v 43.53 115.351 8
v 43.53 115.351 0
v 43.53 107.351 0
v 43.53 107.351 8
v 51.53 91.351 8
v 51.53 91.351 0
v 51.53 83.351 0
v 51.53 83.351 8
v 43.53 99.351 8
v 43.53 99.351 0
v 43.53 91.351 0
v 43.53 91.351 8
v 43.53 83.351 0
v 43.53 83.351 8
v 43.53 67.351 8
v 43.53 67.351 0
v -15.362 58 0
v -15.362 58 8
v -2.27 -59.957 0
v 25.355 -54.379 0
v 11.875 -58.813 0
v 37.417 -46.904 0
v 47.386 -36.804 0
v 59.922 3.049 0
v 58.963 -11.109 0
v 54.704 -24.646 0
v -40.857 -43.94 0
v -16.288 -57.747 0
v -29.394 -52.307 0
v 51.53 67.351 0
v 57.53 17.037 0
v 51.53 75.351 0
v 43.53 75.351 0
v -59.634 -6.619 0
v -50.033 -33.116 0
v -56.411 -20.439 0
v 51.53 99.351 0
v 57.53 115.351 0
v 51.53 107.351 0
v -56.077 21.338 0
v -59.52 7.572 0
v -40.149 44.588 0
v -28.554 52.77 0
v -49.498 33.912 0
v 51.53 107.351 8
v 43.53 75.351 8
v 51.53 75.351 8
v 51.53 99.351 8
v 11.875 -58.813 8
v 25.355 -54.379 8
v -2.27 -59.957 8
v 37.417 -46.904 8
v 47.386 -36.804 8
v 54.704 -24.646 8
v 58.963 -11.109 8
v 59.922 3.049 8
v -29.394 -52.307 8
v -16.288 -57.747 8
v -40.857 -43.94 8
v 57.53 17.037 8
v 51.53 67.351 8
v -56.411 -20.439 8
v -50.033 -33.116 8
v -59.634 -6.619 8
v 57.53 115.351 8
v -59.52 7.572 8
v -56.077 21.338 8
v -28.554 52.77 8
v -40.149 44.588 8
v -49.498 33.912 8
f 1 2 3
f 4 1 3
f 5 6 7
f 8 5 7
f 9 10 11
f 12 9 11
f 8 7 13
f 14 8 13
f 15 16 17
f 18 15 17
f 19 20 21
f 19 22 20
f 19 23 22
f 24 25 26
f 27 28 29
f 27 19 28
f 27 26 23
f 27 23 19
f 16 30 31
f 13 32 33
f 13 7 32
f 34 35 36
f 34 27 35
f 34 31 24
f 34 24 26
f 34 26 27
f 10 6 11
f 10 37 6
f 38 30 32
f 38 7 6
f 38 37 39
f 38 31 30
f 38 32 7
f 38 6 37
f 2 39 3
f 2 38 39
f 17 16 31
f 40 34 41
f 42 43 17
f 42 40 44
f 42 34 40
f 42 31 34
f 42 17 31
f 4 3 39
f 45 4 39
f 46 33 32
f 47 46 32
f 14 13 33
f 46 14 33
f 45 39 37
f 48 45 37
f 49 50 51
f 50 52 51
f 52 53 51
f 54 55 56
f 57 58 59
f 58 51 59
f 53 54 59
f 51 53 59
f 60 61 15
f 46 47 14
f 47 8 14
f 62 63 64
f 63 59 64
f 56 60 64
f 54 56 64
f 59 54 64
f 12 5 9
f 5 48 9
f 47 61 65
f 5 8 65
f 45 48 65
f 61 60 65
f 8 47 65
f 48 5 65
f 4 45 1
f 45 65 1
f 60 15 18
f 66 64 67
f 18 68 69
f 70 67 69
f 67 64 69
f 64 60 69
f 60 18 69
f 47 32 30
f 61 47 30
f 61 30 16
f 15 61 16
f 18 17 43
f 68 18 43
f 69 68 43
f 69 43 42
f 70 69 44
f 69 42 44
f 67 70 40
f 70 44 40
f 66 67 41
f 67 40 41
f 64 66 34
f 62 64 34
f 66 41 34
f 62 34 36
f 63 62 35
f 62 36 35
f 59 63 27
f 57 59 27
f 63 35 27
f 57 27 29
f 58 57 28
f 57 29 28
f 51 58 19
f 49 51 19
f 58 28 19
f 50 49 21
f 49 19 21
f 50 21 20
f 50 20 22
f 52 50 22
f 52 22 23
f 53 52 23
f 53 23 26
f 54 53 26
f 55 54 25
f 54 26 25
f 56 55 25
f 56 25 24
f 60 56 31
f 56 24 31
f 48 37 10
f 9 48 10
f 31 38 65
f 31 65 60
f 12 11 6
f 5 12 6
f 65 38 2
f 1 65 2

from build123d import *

# Parameters (mm, degrees)
PAD_DEPTH = 8


with BuildPart() as part:
    # Sketch → Pad (new body)
    with BuildSketch(Plane.XY):
        with BuildLine():
            Line((51.5303, 115.351058), (57.5303, 115.351058))
            Line((57.5303, 115.351058), (57.5303, 17.037153))
            ThreePointArc((-15.362291, 58), (-29.394284, -52.306558), (57.5303, 17.037153))
            Line((43.5303, 67.351058), (-15.362291, 58))
            Line((51.5303, 67.351058), (43.5303, 67.351058))
            Line((51.5303, 75.351058), (51.5303, 67.351058))
            Line((43.5303, 75.351058), (51.5303, 75.351058))
            Line((43.5303, 83.351058), (43.5303, 75.351058))
            Line((51.5303, 83.351058), (43.5303, 83.351058))
            Line((51.5303, 91.351058), (51.5303, 83.351058))
            Line((43.5303, 91.351058), (51.5303, 91.351058))
            Line((43.5303, 99.351058), (43.5303, 91.351058))
            Line((51.5303, 99.351058), (43.5303, 99.351058))
            Line((51.5303, 107.351058), (51.5303, 99.351058))
            Line((43.5303, 107.351058), (51.5303, 107.351058))
            Line((43.5303, 115.351058), (43.5303, 107.351058))
            Line((51.5303, 115.351058), (43.5303, 115.351058))
        make_face()
    extrude(amount=PAD_DEPTH)


solid = part.part
